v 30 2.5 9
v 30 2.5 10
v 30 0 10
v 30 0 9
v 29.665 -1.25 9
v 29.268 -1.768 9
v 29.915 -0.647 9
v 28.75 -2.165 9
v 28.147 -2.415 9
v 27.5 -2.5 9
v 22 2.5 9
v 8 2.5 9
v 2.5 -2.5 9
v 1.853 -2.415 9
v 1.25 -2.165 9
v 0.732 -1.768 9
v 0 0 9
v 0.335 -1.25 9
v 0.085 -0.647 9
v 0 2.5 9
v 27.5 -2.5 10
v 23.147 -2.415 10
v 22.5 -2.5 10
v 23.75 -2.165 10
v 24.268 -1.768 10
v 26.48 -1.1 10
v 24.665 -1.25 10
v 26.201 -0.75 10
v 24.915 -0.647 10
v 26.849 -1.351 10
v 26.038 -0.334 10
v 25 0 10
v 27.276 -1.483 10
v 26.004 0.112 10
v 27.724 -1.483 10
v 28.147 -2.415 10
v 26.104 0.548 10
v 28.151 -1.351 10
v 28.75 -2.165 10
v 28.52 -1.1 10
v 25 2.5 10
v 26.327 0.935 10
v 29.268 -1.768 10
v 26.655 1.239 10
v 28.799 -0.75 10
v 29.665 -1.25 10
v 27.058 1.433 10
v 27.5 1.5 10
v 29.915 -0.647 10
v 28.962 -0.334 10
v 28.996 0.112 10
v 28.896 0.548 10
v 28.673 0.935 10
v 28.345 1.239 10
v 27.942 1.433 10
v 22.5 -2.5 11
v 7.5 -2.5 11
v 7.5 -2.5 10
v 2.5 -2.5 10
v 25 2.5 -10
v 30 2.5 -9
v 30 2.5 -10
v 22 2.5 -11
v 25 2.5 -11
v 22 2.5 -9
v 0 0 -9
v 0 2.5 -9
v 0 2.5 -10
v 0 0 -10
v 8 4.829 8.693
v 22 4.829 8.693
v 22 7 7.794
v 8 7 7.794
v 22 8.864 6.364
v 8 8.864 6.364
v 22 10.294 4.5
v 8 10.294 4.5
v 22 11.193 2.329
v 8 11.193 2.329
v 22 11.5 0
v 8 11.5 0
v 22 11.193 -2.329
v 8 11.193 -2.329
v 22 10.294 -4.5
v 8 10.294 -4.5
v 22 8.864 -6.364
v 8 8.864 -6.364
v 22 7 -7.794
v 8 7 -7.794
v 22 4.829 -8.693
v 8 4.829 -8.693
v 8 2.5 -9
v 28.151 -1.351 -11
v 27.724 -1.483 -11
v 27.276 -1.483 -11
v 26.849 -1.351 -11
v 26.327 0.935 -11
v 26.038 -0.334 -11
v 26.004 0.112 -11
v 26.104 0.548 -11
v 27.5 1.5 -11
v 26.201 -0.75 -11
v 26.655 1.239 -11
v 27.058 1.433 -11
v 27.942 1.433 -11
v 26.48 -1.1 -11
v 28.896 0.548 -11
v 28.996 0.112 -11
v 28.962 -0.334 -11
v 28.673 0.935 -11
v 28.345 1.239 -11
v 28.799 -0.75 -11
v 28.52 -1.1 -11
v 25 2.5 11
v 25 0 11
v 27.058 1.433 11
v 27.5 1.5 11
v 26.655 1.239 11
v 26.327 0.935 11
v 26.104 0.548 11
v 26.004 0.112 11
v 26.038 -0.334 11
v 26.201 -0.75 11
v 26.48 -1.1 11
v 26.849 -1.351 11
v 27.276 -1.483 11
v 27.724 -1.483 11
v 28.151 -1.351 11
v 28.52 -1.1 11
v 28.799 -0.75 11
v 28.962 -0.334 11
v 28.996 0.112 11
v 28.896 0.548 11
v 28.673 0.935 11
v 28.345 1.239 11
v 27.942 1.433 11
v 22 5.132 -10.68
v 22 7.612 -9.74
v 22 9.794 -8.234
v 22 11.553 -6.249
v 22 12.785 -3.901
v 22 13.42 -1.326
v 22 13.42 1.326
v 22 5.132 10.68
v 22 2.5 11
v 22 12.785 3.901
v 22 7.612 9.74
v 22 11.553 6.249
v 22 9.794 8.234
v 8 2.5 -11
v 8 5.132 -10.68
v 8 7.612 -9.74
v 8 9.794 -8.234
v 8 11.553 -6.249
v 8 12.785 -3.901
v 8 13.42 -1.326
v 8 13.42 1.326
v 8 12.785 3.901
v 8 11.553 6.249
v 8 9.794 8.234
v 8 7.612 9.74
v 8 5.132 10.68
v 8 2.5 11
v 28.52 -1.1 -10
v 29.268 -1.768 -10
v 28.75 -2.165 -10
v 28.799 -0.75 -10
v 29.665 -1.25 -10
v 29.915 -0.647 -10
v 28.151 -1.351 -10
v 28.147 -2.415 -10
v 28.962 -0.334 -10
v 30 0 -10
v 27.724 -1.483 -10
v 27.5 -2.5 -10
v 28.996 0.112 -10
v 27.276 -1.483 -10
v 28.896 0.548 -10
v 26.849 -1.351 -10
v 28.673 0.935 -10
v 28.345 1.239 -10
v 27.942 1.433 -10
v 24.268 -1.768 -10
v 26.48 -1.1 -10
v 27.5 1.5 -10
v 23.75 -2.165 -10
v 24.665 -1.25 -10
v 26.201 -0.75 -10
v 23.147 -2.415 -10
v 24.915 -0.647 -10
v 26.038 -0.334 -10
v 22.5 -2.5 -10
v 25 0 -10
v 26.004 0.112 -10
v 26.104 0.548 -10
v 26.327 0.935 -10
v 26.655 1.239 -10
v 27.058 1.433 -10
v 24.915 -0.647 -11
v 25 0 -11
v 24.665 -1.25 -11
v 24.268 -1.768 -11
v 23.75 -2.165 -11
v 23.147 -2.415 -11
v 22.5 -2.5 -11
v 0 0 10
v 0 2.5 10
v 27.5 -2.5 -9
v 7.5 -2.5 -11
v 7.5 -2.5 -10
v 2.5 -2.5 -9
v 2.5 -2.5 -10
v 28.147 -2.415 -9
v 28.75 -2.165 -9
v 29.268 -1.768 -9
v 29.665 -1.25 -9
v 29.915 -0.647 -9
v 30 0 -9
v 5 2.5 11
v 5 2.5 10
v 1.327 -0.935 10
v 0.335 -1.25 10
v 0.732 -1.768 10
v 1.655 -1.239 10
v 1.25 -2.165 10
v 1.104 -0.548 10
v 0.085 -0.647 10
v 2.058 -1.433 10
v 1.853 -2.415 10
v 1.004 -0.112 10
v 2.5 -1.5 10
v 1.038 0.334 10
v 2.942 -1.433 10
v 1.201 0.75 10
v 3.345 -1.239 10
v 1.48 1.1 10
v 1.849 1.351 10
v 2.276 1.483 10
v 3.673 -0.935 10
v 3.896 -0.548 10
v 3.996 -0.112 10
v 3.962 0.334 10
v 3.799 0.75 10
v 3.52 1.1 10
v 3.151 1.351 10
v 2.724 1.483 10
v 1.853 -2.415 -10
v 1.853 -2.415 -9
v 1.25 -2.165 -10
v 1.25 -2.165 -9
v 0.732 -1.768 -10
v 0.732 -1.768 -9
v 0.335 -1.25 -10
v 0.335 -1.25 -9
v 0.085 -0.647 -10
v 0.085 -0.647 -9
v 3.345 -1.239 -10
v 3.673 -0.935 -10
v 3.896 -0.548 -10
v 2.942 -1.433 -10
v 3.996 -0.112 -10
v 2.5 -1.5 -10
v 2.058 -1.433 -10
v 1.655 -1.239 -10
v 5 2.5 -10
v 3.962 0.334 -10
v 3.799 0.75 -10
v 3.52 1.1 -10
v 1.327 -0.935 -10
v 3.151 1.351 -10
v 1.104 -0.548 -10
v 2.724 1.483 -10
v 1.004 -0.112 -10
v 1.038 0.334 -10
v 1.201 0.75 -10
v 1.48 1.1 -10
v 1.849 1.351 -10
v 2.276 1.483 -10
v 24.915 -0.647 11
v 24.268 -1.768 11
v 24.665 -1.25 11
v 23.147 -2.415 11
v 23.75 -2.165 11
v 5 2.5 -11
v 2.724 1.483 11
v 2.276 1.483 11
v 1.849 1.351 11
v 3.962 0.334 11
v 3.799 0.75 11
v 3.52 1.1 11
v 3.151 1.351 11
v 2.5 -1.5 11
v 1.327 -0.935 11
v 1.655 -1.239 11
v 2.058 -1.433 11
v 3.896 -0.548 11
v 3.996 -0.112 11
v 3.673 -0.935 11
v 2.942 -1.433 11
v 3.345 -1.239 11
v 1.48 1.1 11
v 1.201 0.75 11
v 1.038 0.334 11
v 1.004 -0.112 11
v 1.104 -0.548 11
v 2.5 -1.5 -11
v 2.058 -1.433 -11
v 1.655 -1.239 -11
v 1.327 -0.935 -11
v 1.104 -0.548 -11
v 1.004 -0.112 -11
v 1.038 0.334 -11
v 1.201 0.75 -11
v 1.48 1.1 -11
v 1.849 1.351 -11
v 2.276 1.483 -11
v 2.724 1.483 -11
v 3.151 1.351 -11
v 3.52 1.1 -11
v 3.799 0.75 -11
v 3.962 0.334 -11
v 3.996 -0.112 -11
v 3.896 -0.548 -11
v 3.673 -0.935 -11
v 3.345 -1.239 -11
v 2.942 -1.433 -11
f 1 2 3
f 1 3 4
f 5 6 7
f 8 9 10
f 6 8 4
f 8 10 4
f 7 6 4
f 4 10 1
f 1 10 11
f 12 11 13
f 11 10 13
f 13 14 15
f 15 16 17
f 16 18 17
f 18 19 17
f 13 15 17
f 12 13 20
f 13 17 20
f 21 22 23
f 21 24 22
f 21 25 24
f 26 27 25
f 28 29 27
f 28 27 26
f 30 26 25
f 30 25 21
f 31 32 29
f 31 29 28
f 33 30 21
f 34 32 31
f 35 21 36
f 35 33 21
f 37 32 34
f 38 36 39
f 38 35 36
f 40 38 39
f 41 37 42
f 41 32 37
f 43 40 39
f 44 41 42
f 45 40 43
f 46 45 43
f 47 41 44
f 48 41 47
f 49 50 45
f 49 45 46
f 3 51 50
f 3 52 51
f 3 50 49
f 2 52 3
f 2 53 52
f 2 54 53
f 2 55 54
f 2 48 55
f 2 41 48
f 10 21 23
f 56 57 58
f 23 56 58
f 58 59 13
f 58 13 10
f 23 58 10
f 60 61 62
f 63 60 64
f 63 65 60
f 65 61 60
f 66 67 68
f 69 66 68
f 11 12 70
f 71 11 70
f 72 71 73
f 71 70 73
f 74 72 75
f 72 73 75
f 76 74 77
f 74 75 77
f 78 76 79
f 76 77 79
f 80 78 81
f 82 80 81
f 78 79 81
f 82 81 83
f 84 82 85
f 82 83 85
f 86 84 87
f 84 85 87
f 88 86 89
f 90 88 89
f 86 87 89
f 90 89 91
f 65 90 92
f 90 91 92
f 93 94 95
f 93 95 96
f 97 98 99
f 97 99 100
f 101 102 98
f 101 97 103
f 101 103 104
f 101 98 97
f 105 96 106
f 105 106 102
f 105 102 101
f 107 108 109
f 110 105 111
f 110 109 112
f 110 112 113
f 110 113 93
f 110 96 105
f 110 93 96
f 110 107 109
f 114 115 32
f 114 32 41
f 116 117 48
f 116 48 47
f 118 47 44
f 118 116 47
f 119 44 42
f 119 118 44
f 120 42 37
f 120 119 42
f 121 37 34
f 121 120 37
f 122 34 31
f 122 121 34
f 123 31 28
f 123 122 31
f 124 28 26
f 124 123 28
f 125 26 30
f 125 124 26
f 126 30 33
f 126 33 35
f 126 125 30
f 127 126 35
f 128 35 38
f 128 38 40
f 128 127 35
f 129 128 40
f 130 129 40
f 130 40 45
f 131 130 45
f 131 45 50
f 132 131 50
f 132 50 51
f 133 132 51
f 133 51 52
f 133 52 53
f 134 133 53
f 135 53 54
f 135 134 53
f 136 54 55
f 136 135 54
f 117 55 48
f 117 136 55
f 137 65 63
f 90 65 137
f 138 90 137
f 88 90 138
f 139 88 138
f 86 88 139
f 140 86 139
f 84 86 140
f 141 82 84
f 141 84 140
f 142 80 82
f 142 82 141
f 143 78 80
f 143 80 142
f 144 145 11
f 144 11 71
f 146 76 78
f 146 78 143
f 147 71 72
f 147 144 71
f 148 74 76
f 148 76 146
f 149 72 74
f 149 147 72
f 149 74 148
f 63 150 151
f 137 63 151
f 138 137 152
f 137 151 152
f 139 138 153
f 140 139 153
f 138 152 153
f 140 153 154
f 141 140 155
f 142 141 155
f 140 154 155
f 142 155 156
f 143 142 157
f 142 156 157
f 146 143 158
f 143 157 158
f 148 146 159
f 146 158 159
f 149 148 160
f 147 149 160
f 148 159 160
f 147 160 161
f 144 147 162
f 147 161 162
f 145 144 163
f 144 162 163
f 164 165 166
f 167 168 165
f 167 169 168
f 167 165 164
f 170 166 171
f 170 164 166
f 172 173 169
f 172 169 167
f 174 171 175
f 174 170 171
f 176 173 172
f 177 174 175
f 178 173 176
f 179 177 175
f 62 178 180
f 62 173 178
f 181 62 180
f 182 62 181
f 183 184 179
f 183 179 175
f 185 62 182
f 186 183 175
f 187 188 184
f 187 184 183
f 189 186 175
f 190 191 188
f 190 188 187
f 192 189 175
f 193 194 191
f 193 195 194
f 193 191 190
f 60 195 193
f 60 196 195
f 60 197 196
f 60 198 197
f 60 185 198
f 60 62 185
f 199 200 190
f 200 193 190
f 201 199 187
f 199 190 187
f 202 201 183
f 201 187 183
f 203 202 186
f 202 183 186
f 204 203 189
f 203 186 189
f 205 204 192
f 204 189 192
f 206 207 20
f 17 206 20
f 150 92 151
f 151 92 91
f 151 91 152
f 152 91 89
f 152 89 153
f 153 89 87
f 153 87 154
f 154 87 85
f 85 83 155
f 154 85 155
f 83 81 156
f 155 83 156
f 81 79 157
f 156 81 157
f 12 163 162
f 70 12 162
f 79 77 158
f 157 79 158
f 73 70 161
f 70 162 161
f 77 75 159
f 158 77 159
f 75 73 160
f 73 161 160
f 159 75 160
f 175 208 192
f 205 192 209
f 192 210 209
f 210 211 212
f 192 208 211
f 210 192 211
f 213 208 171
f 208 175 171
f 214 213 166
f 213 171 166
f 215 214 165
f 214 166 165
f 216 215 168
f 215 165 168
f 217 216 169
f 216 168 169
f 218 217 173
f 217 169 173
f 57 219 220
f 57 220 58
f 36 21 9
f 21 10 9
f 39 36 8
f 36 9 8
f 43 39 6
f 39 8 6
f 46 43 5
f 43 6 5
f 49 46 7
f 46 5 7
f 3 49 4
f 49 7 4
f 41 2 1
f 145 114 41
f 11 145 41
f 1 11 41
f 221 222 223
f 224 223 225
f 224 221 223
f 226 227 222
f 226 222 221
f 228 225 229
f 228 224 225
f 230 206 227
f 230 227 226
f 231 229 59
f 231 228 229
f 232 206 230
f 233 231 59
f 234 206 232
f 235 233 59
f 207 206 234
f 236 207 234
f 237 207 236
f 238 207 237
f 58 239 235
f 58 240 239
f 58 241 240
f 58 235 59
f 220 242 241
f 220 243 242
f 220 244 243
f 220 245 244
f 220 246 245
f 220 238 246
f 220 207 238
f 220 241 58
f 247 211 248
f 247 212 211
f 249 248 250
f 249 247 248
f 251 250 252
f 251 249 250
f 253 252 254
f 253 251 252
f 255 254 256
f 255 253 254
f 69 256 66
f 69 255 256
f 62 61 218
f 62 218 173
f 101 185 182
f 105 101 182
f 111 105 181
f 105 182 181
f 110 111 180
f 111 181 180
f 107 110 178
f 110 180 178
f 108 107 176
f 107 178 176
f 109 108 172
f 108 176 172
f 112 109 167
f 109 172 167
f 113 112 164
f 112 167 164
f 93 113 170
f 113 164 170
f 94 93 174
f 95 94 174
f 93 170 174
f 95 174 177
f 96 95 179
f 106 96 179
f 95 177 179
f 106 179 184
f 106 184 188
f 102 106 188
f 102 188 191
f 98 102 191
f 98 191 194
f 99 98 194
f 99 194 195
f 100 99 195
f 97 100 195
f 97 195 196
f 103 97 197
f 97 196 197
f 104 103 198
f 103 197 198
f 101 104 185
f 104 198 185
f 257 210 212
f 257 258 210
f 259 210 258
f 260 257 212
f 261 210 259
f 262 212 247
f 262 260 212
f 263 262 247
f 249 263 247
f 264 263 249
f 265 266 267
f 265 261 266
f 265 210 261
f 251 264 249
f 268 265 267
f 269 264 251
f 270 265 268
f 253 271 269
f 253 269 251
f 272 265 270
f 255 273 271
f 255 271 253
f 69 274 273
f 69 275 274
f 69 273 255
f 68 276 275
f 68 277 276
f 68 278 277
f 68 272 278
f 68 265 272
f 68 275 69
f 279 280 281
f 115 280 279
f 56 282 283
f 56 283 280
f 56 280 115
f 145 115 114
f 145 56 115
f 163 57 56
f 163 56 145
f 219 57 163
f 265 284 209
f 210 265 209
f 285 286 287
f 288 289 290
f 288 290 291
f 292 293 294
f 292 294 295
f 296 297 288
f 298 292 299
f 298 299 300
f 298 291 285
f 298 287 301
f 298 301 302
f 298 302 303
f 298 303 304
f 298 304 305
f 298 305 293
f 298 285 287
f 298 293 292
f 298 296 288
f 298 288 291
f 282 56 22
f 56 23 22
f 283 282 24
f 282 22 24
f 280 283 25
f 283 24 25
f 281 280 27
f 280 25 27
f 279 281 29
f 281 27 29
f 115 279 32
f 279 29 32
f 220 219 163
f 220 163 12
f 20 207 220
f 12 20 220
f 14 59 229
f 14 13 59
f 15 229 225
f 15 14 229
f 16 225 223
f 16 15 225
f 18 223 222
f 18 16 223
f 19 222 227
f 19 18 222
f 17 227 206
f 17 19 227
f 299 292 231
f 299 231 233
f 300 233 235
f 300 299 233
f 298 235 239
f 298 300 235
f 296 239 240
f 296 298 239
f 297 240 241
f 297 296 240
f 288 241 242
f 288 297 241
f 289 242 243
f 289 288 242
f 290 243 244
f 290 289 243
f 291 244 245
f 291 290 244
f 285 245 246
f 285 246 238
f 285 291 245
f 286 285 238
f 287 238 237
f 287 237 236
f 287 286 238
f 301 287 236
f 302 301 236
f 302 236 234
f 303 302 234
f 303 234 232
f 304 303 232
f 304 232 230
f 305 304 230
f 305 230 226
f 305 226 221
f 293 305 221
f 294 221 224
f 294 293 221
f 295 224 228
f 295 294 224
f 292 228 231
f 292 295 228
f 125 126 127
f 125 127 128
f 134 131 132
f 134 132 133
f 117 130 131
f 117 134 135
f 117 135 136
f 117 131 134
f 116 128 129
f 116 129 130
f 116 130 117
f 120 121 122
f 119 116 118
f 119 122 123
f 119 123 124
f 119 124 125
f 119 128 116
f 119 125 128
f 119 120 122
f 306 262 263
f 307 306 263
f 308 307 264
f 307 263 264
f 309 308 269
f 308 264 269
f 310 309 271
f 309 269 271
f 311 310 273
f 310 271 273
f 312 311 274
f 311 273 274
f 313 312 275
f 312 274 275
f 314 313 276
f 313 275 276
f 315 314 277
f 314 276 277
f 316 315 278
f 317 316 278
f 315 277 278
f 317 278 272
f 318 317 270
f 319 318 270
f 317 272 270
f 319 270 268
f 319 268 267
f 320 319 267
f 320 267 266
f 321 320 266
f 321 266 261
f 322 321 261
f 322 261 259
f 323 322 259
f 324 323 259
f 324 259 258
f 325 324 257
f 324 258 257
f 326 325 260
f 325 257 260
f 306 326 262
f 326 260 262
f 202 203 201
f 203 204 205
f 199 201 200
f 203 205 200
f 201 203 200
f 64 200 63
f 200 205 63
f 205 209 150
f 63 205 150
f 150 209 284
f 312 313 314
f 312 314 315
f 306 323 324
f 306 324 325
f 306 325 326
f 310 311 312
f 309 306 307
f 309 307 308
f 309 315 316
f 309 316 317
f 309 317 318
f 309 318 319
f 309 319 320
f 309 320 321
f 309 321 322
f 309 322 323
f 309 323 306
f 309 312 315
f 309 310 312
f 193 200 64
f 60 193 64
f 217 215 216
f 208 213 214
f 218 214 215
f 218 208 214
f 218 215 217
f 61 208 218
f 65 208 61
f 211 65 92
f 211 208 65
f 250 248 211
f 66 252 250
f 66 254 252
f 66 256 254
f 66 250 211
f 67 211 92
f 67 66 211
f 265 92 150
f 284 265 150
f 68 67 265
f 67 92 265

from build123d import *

# Parameters (mm, degrees)
SKETCH3_W             = 2
SKETCH3_H             = 5
BOSS_EXTRUDE1_DEPTH   = 30
BOSS_EXTRUDE1_2_DEPTH = 30
SKETCH4_W             = 5
SKETCH4_H             = 5
CUT_EXTRUDE1_DEPTH    = 1
SKETCH5_W             = 5
SKETCH5_H             = 5
CUT_EXTRUDE2_DEPTH    = 1
SWEEP1_START          = 8
SWEEP1_DEPTH          = 14
SKETCH7_R             = 1.5
BOSS_EXTRUDE2_DEPTH   = 1
BOSS_EXTRUDE3_START   = 1
SKETCH8_R             = 1.5
BOSS_EXTRUDE3_DEPTH   = 1
FILLET1_R             = 2.5
CUT_EXTRUDE3_DEPTH    = 1
CUT_EXTRUDE4_DEPTH    = 1
FILLET2_R             = 2.5


# Read off the part's stored shape, not the designer's step: Sweep1
with BuildPart() as part:
    # Sketch3 → Boss-Extrude1 (new body)
    with BuildSketch(Plane(origin=(0, 0, 0), x_dir=(0, 0, -1), z_dir=(1, 0, 0))):
        with Locations((-10, 0)):
            Rectangle(SKETCH3_W, SKETCH3_H)
    extrude(amount=BOSS_EXTRUDE1_DEPTH)

    # Sketch4 → Cut-Extrude1 (cut)
    with BuildSketch(Plane.XY.offset(11)):
        with Locations((2.5, 0)):
            Rectangle(SKETCH4_W, SKETCH4_H)
        with Locations((27.5, 0)):
            Rectangle(SKETCH4_W, SKETCH4_H)
    extrude(amount=-CUT_EXTRUDE1_DEPTH, mode=Mode.SUBTRACT)



with BuildPart() as body_2:
    # Sketch3 → Boss-Extrude1 2 (new body)
    with BuildSketch(Plane(origin=(0, 0, 0), x_dir=(0, 0, -1), z_dir=(1, 0, 0))):
        with Locations((10, 0)):
            Rectangle(SKETCH3_W, SKETCH3_H)
    extrude(amount=BOSS_EXTRUDE1_2_DEPTH)

    # Sketch5 → Cut-Extrude2 (cut)
    with BuildSketch(Plane(origin=(0, 0, -11), x_dir=(-1, 0, 0), z_dir=(0, 0, -1))):
        with Locations((-27.5, 0)):
            Rectangle(SKETCH5_W, SKETCH5_H)
        with Locations((-2.5, 0)):
            Rectangle(SKETCH5_W, SKETCH5_H)
    extrude(amount=-CUT_EXTRUDE2_DEPTH, mode=Mode.SUBTRACT)


with BuildPart() as part_1:
    add(part.part)

    add(body_2.part)  # Sweep1 merges body 2
    # Sweep1 outline → Sweep1 (add)
    with BuildSketch(Plane.YZ.offset(SWEEP1_START)):
        with BuildLine():
            Line((2.5, -9), (2.5, -11))
            ThreePointArc((2.5, -11), (13.5, 0), (2.5, 11))
            Line((2.5, 11), (2.5, 9))
            ThreePointArc((2.5, 9), (11.5, 0), (2.5, -9))
        make_face()
    extrude(amount=SWEEP1_DEPTH)

    # Sketch7 → Boss-Extrude2 (add)
    with BuildSketch(Plane(origin=(0, 0, -10), x_dir=(-1, 0, 0), z_dir=(0, 0, -1))):
        with Locations(Location((-2.5, 0, 0), (0, 0, 270))):
            Circle(SKETCH7_R)
        with Locations(Location((-27.5, 0, 0), (0, 0, 90))):
            Circle(SKETCH7_R)
    extrude(amount=BOSS_EXTRUDE2_DEPTH)

    # Sketch8 → Boss-Extrude3 (add)
    with BuildSketch(Plane.XY.offset(10).offset(BOSS_EXTRUDE3_START)):
        with Locations(Location((27.5, 0, 0), (0, 0, 90))):
            Circle(SKETCH8_R)
        with Locations(Location((2.5, 0, 0), (0, 0, 270))):
            Circle(SKETCH8_R)
    extrude(amount=-BOSS_EXTRUDE3_DEPTH)

    # Fillet1
    fillet1_edges = [part_1.edges().sort_by_distance(p)[0] for p in [
        (0, -2.5, 9.5),
        (30, -2.5, 9.5),
        (30, -2.5, -9.5),
        (0, -2.5, -9.5),
    ]]
    fillet(fillet1_edges, radius=FILLET1_R)

    # Sketch9 → Cut-Extrude3 (cut)
    with BuildSketch(Plane.XY.offset(11)):
        Polygon((5, 2.5), (7.5, -2.5), (5, -2.5), align=None)
    extrude(amount=-CUT_EXTRUDE3_DEPTH, mode=Mode.SUBTRACT)

    # Sketch10 → Cut-Extrude4 (cut)
    with BuildSketch(Plane(origin=(0, 0, -11), x_dir=(-1, 0, 0), z_dir=(0, 0, -1))):
        Polygon((-5, 2.5), (-7.5, -2.5), (-5, -2.5), align=None)
    extrude(amount=-CUT_EXTRUDE4_DEPTH, mode=Mode.SUBTRACT)

    # Fillet2
    fillet2_edges = [part_1.edges().sort_by_distance(p)[0] for p in [
        (25, -2.5, 10.5),
        (25, -2.5, -10.5),
    ]]
    fillet(fillet2_edges, radius=FILLET2_R)


solid = part_1.part
